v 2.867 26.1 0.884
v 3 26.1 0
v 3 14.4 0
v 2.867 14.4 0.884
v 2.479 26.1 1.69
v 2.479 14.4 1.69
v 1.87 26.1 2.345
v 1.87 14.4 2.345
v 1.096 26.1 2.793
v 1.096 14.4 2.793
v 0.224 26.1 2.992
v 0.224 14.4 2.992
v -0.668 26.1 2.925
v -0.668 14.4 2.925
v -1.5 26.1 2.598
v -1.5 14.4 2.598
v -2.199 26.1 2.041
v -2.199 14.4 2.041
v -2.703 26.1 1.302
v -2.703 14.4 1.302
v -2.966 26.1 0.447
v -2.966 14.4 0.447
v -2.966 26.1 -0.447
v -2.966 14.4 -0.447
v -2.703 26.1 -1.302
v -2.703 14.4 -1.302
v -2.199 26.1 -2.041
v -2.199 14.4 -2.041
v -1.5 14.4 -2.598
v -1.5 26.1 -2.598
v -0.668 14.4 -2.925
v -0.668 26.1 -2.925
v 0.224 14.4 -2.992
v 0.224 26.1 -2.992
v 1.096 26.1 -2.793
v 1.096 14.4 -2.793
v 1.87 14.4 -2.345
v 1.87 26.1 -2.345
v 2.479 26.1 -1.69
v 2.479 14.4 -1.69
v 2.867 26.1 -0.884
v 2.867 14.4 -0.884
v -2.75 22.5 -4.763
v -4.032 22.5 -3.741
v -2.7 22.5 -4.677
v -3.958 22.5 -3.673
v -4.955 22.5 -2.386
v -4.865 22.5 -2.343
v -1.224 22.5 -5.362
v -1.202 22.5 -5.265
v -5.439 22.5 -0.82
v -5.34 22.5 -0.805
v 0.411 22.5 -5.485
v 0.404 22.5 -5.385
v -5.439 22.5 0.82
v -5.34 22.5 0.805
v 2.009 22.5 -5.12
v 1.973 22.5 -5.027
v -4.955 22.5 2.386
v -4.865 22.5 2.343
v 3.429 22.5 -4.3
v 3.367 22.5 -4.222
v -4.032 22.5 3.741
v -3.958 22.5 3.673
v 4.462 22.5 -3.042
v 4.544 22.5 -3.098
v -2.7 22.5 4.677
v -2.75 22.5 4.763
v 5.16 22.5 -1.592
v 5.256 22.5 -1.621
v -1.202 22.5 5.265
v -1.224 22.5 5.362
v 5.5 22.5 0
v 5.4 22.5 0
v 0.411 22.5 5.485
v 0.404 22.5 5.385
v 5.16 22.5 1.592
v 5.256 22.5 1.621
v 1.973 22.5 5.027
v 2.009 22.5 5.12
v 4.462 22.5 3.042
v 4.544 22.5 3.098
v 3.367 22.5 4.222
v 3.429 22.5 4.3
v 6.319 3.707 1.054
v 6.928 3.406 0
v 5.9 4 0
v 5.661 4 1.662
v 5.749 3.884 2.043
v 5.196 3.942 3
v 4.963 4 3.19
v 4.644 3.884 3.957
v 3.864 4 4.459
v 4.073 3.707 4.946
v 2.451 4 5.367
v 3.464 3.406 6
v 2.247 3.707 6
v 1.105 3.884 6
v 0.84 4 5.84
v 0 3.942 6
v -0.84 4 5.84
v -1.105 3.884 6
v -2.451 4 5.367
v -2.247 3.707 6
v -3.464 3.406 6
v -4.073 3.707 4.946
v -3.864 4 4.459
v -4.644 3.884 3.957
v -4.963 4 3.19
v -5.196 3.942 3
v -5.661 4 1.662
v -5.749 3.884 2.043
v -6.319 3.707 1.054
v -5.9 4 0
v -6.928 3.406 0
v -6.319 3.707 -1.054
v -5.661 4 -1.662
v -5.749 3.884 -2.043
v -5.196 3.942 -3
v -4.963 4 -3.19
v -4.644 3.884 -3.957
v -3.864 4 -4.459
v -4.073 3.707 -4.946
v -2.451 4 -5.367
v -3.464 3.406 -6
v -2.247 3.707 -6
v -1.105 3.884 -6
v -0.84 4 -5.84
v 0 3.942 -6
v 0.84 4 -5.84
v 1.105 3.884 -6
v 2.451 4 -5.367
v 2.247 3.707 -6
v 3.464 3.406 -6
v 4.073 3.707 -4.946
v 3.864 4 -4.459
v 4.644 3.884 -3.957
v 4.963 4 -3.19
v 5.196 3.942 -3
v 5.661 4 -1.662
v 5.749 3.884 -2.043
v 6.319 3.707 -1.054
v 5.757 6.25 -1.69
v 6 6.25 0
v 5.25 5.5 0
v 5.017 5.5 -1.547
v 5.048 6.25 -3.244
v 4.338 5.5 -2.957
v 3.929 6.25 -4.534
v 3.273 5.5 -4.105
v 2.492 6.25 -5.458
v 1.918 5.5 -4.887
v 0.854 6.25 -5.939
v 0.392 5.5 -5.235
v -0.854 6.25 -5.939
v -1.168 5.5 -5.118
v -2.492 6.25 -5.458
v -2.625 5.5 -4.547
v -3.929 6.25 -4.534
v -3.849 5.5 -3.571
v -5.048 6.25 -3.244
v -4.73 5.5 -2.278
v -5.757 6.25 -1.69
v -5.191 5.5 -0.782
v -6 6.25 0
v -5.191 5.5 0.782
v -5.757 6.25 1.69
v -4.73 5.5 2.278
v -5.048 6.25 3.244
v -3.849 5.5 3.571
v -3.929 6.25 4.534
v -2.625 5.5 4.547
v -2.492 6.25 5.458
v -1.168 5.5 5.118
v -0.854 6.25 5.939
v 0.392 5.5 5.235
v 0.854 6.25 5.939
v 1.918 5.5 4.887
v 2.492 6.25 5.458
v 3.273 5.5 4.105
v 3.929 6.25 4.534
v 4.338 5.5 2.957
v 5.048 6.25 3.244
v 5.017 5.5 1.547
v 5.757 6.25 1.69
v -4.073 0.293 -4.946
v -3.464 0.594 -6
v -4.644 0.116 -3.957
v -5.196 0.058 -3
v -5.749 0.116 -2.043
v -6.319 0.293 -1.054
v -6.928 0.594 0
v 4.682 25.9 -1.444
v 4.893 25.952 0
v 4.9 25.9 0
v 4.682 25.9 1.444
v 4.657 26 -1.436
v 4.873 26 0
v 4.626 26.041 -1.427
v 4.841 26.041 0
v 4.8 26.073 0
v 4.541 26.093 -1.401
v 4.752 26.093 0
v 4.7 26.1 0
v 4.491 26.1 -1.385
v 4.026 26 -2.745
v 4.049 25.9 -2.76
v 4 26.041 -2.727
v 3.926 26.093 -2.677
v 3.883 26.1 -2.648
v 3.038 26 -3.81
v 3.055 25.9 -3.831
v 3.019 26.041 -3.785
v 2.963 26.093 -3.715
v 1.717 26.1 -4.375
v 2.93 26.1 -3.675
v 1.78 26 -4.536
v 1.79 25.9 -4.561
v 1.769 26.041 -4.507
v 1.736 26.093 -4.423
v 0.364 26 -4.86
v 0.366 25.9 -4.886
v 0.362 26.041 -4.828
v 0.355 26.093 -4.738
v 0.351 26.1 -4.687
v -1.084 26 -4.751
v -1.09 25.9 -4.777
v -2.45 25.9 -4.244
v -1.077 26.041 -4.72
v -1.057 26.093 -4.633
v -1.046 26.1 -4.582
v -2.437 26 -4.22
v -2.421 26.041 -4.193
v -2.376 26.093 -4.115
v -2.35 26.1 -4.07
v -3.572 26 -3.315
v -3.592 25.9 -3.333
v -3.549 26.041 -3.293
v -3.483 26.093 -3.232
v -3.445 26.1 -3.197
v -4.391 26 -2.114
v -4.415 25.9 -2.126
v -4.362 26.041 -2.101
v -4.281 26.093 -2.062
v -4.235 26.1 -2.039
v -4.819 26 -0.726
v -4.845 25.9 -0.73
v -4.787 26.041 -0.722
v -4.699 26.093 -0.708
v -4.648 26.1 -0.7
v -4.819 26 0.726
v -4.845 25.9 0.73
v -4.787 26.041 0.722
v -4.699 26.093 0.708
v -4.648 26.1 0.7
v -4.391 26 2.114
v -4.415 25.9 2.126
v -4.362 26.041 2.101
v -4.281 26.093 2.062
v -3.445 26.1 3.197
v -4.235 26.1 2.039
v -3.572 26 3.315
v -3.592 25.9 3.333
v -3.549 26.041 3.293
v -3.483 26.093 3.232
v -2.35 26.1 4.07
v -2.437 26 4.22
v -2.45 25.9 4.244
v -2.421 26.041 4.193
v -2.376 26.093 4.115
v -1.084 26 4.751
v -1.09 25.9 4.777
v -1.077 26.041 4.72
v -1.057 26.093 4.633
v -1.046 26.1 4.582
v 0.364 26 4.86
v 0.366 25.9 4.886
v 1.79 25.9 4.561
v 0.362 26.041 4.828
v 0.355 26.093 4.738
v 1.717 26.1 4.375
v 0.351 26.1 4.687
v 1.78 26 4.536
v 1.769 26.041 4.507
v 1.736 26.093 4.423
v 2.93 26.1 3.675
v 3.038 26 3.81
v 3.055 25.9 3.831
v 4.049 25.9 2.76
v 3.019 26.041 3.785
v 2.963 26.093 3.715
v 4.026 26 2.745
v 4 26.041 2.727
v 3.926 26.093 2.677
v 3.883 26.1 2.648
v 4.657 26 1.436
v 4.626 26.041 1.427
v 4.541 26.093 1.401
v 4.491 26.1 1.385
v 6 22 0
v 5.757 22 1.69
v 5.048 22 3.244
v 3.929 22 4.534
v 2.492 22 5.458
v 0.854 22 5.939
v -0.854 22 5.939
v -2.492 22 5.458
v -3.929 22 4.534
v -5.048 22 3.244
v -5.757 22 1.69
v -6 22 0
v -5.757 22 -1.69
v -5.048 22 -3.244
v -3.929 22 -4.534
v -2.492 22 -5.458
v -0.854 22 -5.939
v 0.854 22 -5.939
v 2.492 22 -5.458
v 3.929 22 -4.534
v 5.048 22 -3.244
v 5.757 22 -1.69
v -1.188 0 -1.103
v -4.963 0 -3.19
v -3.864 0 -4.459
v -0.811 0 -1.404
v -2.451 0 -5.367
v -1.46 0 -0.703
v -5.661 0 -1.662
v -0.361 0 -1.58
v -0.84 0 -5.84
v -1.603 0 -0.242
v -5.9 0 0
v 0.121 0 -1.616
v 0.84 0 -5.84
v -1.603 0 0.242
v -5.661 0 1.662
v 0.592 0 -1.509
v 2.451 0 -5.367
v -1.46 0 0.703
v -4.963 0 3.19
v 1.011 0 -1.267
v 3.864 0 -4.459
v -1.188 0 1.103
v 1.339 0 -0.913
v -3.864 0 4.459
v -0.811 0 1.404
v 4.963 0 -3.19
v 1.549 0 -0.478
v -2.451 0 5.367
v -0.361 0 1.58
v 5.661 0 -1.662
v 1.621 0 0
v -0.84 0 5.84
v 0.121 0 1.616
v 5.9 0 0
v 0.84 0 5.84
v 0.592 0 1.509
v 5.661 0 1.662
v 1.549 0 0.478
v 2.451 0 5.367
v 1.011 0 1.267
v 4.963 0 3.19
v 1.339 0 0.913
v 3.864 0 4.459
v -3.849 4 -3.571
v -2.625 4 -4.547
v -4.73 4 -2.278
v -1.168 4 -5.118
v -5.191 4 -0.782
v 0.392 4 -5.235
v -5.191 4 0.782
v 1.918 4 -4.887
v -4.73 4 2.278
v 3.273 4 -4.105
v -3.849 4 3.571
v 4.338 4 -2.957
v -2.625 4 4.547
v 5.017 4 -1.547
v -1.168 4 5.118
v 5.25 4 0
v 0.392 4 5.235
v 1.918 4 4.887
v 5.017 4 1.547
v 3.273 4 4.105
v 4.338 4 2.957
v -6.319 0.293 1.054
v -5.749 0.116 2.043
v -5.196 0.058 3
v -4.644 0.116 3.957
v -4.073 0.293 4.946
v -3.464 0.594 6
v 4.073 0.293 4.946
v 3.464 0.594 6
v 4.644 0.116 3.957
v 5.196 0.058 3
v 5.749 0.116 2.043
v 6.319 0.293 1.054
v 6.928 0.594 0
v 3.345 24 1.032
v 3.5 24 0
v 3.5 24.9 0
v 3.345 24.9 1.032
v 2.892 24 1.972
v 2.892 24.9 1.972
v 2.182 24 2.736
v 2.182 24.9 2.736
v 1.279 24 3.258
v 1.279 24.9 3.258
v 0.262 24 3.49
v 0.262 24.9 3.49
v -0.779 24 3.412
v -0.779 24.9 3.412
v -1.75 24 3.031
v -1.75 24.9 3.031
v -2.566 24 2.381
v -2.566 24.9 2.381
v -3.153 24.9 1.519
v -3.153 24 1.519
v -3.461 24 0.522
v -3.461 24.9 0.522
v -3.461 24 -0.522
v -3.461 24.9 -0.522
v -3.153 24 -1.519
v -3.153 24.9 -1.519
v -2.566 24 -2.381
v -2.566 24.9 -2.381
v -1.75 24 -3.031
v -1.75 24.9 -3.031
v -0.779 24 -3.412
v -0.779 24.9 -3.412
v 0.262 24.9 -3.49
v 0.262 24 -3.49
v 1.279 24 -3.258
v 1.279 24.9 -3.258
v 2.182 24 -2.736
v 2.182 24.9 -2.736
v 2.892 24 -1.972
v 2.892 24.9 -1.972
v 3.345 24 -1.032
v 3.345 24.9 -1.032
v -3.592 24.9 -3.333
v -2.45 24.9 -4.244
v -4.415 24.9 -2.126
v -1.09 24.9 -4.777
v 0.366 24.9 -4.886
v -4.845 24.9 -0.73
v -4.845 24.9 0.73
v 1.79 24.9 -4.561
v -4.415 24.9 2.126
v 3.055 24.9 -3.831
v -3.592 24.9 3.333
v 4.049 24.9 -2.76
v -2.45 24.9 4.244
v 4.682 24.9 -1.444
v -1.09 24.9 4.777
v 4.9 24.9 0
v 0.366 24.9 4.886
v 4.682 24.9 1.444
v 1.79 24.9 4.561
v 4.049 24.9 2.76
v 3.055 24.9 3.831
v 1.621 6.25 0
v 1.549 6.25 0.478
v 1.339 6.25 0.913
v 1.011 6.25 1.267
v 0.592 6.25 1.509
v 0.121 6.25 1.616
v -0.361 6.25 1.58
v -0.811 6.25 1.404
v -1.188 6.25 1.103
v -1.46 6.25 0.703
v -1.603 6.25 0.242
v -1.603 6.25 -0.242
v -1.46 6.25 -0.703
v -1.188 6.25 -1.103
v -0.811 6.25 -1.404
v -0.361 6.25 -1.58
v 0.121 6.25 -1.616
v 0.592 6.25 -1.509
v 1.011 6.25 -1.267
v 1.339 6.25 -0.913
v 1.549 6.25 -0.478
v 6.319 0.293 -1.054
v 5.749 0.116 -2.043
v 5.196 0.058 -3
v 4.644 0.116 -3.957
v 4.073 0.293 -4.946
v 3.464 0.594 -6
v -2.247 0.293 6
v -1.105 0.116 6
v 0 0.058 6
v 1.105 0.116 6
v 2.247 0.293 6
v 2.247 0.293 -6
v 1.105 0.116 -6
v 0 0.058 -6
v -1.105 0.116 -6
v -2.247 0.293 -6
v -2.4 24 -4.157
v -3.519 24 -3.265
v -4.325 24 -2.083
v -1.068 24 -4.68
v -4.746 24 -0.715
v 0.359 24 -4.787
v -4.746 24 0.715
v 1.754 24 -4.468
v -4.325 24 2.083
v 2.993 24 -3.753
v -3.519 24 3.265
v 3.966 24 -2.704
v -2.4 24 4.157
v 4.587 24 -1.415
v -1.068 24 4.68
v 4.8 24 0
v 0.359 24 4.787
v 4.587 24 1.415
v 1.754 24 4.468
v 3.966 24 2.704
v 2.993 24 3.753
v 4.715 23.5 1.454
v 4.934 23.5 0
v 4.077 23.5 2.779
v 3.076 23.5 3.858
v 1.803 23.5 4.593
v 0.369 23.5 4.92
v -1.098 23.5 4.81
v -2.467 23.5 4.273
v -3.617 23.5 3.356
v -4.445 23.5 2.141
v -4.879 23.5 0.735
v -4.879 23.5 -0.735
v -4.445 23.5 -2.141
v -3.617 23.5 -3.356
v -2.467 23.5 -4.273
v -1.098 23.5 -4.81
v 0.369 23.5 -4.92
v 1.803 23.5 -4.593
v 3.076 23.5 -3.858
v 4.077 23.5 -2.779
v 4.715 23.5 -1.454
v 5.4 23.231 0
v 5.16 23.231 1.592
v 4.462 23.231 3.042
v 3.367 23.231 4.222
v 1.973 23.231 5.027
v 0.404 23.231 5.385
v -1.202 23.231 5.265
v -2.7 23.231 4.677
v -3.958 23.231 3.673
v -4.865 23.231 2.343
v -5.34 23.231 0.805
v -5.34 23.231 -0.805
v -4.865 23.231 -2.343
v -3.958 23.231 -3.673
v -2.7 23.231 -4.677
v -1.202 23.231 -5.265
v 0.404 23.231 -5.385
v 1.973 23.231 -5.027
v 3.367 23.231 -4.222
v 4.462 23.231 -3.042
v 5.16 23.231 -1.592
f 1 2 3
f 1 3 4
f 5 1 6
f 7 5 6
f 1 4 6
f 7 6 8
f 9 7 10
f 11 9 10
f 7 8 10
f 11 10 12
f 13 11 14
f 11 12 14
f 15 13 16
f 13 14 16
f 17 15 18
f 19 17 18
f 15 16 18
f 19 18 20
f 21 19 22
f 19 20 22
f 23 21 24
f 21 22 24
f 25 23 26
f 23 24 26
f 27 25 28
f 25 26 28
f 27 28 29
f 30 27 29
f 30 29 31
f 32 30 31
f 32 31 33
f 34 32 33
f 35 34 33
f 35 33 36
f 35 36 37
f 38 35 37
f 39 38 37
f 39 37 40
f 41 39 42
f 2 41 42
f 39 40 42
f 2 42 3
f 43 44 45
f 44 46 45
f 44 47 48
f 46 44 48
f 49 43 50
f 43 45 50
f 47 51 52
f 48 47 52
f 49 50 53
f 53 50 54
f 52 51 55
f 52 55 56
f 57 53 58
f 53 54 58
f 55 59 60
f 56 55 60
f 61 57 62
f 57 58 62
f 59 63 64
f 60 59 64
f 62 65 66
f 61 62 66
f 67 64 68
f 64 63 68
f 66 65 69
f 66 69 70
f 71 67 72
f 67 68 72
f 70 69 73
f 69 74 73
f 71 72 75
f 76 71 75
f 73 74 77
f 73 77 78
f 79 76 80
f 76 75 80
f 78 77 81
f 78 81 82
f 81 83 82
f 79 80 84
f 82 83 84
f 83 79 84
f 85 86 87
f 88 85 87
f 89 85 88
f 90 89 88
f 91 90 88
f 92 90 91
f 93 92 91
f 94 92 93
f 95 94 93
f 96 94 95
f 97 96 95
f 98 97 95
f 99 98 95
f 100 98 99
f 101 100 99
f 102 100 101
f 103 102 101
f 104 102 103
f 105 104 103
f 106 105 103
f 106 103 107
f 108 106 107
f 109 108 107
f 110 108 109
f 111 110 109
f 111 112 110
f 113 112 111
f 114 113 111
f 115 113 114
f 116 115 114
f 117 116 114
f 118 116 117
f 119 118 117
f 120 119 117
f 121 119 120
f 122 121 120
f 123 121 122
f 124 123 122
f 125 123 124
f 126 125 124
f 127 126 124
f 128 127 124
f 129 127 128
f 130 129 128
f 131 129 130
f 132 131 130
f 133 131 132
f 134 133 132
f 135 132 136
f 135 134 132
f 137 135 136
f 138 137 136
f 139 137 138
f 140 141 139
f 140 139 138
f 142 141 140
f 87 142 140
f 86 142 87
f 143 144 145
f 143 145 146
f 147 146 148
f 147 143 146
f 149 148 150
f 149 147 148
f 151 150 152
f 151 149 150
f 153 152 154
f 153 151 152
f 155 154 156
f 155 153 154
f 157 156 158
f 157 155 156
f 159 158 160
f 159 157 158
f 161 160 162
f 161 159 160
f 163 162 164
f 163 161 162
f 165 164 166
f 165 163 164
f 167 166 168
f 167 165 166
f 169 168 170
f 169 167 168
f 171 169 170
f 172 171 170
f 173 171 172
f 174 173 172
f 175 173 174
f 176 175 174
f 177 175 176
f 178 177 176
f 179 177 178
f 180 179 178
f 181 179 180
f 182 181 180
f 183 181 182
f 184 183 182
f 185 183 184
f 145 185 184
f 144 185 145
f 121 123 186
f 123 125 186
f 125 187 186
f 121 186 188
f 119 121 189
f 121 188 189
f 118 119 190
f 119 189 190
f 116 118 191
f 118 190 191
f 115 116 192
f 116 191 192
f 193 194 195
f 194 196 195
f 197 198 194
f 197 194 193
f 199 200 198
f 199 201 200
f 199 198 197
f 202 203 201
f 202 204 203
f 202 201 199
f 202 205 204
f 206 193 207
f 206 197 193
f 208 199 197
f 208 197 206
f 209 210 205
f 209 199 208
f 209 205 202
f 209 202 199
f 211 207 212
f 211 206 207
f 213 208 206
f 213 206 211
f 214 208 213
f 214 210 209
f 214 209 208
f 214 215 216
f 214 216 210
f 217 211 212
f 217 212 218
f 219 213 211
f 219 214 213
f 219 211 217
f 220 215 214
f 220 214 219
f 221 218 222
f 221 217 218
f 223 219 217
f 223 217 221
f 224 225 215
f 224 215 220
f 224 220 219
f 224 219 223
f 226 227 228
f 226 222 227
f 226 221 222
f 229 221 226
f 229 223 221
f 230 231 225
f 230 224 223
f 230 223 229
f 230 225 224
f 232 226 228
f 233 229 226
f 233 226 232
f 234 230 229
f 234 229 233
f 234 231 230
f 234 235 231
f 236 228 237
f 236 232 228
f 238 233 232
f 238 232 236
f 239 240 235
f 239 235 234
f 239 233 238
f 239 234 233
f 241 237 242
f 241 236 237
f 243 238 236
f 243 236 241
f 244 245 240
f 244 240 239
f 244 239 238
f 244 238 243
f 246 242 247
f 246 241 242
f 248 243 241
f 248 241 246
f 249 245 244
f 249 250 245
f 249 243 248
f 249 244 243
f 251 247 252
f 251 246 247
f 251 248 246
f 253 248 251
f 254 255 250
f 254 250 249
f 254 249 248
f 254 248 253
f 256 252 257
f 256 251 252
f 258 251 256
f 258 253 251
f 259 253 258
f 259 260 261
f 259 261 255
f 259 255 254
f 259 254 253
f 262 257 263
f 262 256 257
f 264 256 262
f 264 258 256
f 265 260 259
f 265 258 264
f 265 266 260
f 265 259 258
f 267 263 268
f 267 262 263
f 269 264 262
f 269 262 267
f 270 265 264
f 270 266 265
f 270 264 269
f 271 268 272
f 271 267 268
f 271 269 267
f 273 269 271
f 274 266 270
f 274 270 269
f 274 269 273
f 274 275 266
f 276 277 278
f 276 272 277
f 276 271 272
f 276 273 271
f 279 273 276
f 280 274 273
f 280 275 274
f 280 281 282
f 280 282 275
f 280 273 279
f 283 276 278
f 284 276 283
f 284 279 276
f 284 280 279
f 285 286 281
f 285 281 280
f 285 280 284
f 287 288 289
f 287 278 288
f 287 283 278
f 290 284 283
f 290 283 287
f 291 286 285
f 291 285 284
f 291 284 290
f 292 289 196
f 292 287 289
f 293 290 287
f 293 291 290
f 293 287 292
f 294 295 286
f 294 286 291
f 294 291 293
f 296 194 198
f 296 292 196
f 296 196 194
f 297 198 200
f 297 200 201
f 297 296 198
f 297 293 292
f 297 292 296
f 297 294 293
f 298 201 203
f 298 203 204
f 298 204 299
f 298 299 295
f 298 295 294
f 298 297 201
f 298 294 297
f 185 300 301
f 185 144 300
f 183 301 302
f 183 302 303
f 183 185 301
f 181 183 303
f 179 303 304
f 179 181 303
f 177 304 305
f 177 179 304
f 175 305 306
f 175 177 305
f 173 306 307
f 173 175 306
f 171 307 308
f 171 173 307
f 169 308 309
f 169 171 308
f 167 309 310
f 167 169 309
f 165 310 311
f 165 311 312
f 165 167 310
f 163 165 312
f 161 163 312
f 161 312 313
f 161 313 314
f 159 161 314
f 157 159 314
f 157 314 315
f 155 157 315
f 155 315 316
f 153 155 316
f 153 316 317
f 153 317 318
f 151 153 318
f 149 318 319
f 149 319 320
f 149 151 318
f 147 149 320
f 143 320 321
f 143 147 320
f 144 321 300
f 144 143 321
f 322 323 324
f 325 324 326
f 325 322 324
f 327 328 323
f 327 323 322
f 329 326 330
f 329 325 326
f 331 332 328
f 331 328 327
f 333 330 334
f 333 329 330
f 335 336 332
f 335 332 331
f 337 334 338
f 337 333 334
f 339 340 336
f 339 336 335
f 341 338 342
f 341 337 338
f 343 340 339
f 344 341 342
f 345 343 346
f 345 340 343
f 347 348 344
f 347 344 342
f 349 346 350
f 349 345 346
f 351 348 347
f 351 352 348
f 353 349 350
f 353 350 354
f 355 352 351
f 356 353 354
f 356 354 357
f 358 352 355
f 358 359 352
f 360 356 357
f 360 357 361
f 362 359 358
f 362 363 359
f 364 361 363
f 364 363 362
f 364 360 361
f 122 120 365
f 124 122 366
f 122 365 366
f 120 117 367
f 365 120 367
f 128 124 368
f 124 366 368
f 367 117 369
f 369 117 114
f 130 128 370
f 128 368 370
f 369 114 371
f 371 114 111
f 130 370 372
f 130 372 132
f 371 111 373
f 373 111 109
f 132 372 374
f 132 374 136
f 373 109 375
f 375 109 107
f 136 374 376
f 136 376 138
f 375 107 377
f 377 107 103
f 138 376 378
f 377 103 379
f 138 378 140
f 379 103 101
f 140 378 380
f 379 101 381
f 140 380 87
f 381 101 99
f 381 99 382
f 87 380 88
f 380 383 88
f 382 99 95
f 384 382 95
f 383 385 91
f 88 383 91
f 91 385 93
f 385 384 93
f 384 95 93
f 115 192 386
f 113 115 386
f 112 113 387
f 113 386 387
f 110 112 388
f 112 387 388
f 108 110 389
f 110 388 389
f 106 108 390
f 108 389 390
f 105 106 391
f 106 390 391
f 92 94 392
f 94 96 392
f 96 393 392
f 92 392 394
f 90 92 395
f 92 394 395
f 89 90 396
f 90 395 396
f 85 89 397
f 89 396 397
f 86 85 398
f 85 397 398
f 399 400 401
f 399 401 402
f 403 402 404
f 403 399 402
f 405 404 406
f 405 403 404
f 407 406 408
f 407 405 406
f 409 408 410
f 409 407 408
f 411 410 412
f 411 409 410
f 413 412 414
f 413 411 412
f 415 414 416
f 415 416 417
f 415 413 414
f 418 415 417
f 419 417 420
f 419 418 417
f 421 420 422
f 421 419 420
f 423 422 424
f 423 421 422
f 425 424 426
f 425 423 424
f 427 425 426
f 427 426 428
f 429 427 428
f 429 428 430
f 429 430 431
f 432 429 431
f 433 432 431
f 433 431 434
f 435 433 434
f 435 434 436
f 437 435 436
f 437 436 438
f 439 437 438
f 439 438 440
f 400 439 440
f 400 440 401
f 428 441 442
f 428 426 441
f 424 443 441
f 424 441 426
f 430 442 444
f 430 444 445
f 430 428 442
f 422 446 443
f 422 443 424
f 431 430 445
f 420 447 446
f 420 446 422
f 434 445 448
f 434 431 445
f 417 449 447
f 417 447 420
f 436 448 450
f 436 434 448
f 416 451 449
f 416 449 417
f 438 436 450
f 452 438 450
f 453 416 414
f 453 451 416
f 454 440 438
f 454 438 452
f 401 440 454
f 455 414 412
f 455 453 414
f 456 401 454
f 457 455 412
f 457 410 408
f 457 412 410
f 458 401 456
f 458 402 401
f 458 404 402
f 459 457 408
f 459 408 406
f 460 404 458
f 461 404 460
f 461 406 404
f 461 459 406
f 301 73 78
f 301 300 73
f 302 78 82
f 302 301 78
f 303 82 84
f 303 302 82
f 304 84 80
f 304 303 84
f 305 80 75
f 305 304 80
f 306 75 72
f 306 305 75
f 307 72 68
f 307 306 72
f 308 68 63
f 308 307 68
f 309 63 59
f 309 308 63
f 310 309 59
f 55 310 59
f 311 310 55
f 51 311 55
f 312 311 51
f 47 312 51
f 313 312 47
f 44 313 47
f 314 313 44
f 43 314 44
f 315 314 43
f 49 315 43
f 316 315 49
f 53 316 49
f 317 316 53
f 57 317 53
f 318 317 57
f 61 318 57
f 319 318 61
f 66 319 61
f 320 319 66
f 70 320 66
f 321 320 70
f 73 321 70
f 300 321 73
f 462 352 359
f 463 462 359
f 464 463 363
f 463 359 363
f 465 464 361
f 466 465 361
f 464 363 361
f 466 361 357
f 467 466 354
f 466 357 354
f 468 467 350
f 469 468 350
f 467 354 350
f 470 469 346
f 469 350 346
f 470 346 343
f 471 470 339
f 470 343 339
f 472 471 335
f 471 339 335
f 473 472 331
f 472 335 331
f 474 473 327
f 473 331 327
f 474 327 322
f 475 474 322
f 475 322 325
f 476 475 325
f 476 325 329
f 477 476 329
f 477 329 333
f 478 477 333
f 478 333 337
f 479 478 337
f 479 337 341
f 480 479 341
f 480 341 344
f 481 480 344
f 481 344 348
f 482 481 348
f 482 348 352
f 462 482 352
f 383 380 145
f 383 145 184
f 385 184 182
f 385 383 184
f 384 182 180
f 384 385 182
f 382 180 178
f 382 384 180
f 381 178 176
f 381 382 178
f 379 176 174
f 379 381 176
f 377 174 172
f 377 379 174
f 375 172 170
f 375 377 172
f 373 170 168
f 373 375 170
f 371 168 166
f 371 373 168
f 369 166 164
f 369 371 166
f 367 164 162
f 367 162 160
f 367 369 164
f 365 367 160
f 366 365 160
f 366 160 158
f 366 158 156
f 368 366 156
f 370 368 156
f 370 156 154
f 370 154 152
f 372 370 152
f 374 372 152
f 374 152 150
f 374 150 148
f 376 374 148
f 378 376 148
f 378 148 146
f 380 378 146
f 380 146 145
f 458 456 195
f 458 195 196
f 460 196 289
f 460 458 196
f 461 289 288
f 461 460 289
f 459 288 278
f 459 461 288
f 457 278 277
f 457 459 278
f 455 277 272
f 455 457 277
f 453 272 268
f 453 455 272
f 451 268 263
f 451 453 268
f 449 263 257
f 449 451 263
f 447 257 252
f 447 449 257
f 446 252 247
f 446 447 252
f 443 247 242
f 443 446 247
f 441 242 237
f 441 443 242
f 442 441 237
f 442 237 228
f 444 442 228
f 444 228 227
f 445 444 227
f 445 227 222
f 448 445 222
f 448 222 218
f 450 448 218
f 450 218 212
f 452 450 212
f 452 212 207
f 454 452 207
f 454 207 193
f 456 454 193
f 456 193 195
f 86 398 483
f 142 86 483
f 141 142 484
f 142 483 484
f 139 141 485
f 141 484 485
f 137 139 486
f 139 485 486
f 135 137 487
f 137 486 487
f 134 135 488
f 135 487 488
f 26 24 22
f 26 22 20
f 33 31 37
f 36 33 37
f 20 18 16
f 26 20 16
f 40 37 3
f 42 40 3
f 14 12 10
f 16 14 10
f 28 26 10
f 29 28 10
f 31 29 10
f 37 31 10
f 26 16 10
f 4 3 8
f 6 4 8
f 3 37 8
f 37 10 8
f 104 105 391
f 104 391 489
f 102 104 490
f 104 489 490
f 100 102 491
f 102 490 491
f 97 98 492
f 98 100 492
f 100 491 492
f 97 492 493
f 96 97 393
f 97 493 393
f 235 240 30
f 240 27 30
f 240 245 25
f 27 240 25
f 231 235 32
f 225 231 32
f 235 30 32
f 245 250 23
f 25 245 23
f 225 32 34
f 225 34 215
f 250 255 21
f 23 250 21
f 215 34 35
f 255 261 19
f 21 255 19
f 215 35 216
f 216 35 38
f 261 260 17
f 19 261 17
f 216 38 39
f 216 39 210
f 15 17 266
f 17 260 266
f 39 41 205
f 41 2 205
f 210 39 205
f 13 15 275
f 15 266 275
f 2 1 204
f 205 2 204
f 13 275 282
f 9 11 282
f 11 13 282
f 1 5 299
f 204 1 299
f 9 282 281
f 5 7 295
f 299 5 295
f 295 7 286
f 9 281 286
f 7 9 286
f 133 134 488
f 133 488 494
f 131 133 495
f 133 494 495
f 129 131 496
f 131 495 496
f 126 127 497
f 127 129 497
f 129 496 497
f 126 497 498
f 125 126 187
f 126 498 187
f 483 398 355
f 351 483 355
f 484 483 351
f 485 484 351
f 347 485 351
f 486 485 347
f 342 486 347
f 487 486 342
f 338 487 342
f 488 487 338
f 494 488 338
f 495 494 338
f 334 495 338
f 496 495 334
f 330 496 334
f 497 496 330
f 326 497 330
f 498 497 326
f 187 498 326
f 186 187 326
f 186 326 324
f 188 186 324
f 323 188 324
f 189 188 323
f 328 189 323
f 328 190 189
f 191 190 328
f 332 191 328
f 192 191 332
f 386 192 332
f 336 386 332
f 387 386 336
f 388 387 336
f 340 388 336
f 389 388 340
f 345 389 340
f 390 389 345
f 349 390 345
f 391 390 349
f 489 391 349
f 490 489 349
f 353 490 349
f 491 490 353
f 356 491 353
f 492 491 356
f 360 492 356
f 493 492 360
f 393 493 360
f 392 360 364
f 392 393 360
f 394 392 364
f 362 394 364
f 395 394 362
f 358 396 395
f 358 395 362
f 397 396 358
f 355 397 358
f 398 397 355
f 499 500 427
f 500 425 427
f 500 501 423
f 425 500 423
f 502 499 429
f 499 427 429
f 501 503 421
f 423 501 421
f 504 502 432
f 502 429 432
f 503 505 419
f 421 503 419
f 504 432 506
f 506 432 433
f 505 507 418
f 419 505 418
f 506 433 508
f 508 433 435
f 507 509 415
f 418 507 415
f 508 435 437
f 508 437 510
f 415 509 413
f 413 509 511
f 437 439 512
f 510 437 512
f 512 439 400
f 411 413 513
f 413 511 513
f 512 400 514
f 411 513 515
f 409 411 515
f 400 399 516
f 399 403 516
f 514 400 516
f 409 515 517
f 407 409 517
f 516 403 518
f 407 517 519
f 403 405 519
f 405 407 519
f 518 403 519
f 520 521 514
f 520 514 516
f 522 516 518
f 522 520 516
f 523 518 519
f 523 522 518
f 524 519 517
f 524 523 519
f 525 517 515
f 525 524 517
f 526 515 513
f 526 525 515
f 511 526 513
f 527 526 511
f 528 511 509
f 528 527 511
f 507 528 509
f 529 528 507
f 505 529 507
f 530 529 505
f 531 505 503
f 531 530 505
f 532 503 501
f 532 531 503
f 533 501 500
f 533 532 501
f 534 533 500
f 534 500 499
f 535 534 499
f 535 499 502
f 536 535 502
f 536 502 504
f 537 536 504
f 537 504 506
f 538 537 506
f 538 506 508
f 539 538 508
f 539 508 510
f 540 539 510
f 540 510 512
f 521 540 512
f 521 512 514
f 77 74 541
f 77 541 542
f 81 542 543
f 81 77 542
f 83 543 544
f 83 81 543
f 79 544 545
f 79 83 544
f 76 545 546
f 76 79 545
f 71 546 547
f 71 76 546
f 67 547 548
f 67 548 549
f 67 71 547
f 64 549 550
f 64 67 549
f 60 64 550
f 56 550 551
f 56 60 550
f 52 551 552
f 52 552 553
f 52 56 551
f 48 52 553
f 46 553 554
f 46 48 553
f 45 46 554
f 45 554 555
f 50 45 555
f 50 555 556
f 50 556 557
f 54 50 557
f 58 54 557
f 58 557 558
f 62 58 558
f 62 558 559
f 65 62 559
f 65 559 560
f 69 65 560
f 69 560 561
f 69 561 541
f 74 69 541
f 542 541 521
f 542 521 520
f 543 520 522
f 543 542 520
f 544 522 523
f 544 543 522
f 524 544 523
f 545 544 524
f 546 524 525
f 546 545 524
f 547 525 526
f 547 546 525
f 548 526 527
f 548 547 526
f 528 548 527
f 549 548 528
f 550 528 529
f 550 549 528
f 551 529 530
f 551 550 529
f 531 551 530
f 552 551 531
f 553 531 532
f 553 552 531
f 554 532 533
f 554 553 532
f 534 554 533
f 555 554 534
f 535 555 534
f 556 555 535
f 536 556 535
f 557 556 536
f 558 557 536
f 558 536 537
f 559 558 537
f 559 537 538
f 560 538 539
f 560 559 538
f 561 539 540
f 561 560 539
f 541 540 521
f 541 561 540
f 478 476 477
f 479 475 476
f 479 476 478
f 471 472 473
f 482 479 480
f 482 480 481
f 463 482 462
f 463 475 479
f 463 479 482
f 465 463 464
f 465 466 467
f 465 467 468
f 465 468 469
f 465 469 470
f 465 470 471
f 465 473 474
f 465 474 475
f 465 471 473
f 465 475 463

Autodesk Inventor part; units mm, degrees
sketch "Sketch_1" plane through (0, 0, 0) normal (0, 0, 1) x (1, 0, 0)
  line L0 (0, 0) -> (0, 5.5)
  line L1 (0, 5.5) -> (5.25, 5.5)
  line L2 (5.25, 5.5) -> (5.25, 4)
  line L3 (5.25, 4) -> (5.9, 4)
  line L4 (5.9, 4) -> (7.5, 3.0762)
  line L5 (7.5, 3.0762) -> (7.5, 0.9238)
  line L6 (7.5, 0.9238) -> (5.9, 0)
  line L7 (5.9, 0) -> (0, 0)
  line L8 (0, 0) -> (0, 5.5)
revolve "Revolution1" add sketch "Sketch_1" angle 360 about axis through (0, 0, 0) along (0, -1, 0)
sketch "Sketch_2" plane through (0, 0, 0) normal (0, 1, 0) x (-1, 0, 0)
  line L0 (17.2177, 15.6183) -> (-16.6532, 15.6183)
  line L1 (-16.6532, 15.6183) -> (-16.6532, -14.1129)
  line L2 (-16.6532, -14.1129) -> (17.2177, -14.1129)
  line L3 (17.2177, -14.1129) -> (17.2177, 15.6183)
  line L4 (6.9282, 0) -> (3.4641, 6)
  line L5 (3.4641, 6) -> (-3.4641, 6)
  line L6 (-3.4641, 6) -> (-6.9282, 0)
  line L7 (-6.9282, 0) -> (-3.4641, -6)
  line L8 (-3.4641, -6) -> (3.4641, -6)
  line L9 (3.4641, -6) -> (6.9282, 0)
extrude "Extrusion1" cut sketch "Sketch_2" along normal blind 4
sketch "Sketch_3" plane through (0, 0, 0) normal (0, 0, 1) x (1, 0, 0)
  line L0 (0, 5.5) -> (0, 26.1)
  line L1 (0, 26.1) -> (4.7, 26.1)
  arc A0 (4.9, 25.9) -> (4.7, 26.1) centre (4.7, 25.9) ccw
  line L2 (4.9, 25.9) -> (4.9, 24.9)
  line L3 (4.9, 24.9) -> (3.5, 24.9)
  line L4 (3.5, 24.9) -> (3.5, 24)
  line L5 (3.5, 24) -> (4.8, 24)
  line L6 (4.8, 24) -> (4.934, 23.5)
  line L7 (4.934, 23.5) -> (5.4, 23.2309)
  line L8 (5.4, 23.2309) -> (5.4, 22.5)
  line L9 (5.4, 22.5) -> (5.5, 22.5)
  line L10 (5.5, 22.5) -> (6, 22)
  line L11 (6, 22) -> (6, 6.25)
  line L12 (6, 6.25) -> (5.25, 5.5)
  line L13 (5.25, 5.5) -> (0, 5.5)
  line L14 (0, 5.5) -> (0, 26.1)
revolve "Revolution2" add sketch "Sketch_3" angle 360 about axis through (0, 5.5, 0) along (0, -1, 0)
thread "Thread1" size "M12x1.75" class "6g" standard "ISO Metric profile" full length
sketch "Sketch_4" plane through (0, 0, 0) normal (0, 0, 1) x (1, 0, 0)
  line L0 (0, 14.4) -> (0, 26.1)
  line L1 (0, 26.1) -> (3, 26.1)
  line L2 (3, 26.1) -> (3, 14.4)
  line L3 (3, 14.4) -> (0, 14.4)
  line L4 (0, 14.4) -> (0, 26.1)
revolve "Revolution3" cut sketch "Sketch_4" angle 360 about axis through (0, 14.4, 0) along (0, -1, 0)
sketch "Sketch_5" plane through (0, 0, 0) normal (0, 0, 1) x (1, 0, 0)
  line L0 (0, 0) -> (0, 6.25)
  line L1 (0, 6.25) -> (1.621, 6.25)
  line L2 (1.621, 6.25) -> (1.621, 0)
  line L3 (1.621, 0) -> (0, 0)
  line L4 (0, 0) -> (0, 6.25)
revolve "Revolution4" cut sketch "Sketch_5" angle 360 about axis through (0, 0, 0) along (0, -1, 0)
thread "Thread2" size "M4x0.7" class "6H" standard "ISO Metric profile" full length
ref_plane "IP_DUMMY_XY" through (0, 0, 0) normal (0, 1, 0) x (1, 0, 0)
ref_plane "IP_DUMMY_YZ" through (0, 0, 0) normal (1, 0, 0) x (0, 0, -1)
ref_plane "IP_DUMMY_ZX" through (0, 0, 0) normal (0, 0, -1) x (0, 1, 0)
ref_plane "IP_NUT1_XY" through (0, 11, 0) normal (0, 1, 0) x (1, 0, 0)
ref_plane "IP_NUT1_YZ" through (0, 11, 0) normal (1, 0, 0) x (0, 0, -1)
ref_plane "IP_NUT1_ZX" through (0, 11, 0) normal (0, 0, -1) x (0, 1, 0)
ref_plane "IP_NUT2_XY" through (0, 17, 0) normal (0, 1, 0) x (1, 0, 0)
ref_plane "IP_NUT2_YZ" through (0, 17, 0) normal (1, 0, 0) x (0, 0, -1)
ref_plane "IP_NUT2_ZX" through (0, 17, 0) normal (0, 0, -1) x (0, 1, 0)
properties part number "FVPA106J"
